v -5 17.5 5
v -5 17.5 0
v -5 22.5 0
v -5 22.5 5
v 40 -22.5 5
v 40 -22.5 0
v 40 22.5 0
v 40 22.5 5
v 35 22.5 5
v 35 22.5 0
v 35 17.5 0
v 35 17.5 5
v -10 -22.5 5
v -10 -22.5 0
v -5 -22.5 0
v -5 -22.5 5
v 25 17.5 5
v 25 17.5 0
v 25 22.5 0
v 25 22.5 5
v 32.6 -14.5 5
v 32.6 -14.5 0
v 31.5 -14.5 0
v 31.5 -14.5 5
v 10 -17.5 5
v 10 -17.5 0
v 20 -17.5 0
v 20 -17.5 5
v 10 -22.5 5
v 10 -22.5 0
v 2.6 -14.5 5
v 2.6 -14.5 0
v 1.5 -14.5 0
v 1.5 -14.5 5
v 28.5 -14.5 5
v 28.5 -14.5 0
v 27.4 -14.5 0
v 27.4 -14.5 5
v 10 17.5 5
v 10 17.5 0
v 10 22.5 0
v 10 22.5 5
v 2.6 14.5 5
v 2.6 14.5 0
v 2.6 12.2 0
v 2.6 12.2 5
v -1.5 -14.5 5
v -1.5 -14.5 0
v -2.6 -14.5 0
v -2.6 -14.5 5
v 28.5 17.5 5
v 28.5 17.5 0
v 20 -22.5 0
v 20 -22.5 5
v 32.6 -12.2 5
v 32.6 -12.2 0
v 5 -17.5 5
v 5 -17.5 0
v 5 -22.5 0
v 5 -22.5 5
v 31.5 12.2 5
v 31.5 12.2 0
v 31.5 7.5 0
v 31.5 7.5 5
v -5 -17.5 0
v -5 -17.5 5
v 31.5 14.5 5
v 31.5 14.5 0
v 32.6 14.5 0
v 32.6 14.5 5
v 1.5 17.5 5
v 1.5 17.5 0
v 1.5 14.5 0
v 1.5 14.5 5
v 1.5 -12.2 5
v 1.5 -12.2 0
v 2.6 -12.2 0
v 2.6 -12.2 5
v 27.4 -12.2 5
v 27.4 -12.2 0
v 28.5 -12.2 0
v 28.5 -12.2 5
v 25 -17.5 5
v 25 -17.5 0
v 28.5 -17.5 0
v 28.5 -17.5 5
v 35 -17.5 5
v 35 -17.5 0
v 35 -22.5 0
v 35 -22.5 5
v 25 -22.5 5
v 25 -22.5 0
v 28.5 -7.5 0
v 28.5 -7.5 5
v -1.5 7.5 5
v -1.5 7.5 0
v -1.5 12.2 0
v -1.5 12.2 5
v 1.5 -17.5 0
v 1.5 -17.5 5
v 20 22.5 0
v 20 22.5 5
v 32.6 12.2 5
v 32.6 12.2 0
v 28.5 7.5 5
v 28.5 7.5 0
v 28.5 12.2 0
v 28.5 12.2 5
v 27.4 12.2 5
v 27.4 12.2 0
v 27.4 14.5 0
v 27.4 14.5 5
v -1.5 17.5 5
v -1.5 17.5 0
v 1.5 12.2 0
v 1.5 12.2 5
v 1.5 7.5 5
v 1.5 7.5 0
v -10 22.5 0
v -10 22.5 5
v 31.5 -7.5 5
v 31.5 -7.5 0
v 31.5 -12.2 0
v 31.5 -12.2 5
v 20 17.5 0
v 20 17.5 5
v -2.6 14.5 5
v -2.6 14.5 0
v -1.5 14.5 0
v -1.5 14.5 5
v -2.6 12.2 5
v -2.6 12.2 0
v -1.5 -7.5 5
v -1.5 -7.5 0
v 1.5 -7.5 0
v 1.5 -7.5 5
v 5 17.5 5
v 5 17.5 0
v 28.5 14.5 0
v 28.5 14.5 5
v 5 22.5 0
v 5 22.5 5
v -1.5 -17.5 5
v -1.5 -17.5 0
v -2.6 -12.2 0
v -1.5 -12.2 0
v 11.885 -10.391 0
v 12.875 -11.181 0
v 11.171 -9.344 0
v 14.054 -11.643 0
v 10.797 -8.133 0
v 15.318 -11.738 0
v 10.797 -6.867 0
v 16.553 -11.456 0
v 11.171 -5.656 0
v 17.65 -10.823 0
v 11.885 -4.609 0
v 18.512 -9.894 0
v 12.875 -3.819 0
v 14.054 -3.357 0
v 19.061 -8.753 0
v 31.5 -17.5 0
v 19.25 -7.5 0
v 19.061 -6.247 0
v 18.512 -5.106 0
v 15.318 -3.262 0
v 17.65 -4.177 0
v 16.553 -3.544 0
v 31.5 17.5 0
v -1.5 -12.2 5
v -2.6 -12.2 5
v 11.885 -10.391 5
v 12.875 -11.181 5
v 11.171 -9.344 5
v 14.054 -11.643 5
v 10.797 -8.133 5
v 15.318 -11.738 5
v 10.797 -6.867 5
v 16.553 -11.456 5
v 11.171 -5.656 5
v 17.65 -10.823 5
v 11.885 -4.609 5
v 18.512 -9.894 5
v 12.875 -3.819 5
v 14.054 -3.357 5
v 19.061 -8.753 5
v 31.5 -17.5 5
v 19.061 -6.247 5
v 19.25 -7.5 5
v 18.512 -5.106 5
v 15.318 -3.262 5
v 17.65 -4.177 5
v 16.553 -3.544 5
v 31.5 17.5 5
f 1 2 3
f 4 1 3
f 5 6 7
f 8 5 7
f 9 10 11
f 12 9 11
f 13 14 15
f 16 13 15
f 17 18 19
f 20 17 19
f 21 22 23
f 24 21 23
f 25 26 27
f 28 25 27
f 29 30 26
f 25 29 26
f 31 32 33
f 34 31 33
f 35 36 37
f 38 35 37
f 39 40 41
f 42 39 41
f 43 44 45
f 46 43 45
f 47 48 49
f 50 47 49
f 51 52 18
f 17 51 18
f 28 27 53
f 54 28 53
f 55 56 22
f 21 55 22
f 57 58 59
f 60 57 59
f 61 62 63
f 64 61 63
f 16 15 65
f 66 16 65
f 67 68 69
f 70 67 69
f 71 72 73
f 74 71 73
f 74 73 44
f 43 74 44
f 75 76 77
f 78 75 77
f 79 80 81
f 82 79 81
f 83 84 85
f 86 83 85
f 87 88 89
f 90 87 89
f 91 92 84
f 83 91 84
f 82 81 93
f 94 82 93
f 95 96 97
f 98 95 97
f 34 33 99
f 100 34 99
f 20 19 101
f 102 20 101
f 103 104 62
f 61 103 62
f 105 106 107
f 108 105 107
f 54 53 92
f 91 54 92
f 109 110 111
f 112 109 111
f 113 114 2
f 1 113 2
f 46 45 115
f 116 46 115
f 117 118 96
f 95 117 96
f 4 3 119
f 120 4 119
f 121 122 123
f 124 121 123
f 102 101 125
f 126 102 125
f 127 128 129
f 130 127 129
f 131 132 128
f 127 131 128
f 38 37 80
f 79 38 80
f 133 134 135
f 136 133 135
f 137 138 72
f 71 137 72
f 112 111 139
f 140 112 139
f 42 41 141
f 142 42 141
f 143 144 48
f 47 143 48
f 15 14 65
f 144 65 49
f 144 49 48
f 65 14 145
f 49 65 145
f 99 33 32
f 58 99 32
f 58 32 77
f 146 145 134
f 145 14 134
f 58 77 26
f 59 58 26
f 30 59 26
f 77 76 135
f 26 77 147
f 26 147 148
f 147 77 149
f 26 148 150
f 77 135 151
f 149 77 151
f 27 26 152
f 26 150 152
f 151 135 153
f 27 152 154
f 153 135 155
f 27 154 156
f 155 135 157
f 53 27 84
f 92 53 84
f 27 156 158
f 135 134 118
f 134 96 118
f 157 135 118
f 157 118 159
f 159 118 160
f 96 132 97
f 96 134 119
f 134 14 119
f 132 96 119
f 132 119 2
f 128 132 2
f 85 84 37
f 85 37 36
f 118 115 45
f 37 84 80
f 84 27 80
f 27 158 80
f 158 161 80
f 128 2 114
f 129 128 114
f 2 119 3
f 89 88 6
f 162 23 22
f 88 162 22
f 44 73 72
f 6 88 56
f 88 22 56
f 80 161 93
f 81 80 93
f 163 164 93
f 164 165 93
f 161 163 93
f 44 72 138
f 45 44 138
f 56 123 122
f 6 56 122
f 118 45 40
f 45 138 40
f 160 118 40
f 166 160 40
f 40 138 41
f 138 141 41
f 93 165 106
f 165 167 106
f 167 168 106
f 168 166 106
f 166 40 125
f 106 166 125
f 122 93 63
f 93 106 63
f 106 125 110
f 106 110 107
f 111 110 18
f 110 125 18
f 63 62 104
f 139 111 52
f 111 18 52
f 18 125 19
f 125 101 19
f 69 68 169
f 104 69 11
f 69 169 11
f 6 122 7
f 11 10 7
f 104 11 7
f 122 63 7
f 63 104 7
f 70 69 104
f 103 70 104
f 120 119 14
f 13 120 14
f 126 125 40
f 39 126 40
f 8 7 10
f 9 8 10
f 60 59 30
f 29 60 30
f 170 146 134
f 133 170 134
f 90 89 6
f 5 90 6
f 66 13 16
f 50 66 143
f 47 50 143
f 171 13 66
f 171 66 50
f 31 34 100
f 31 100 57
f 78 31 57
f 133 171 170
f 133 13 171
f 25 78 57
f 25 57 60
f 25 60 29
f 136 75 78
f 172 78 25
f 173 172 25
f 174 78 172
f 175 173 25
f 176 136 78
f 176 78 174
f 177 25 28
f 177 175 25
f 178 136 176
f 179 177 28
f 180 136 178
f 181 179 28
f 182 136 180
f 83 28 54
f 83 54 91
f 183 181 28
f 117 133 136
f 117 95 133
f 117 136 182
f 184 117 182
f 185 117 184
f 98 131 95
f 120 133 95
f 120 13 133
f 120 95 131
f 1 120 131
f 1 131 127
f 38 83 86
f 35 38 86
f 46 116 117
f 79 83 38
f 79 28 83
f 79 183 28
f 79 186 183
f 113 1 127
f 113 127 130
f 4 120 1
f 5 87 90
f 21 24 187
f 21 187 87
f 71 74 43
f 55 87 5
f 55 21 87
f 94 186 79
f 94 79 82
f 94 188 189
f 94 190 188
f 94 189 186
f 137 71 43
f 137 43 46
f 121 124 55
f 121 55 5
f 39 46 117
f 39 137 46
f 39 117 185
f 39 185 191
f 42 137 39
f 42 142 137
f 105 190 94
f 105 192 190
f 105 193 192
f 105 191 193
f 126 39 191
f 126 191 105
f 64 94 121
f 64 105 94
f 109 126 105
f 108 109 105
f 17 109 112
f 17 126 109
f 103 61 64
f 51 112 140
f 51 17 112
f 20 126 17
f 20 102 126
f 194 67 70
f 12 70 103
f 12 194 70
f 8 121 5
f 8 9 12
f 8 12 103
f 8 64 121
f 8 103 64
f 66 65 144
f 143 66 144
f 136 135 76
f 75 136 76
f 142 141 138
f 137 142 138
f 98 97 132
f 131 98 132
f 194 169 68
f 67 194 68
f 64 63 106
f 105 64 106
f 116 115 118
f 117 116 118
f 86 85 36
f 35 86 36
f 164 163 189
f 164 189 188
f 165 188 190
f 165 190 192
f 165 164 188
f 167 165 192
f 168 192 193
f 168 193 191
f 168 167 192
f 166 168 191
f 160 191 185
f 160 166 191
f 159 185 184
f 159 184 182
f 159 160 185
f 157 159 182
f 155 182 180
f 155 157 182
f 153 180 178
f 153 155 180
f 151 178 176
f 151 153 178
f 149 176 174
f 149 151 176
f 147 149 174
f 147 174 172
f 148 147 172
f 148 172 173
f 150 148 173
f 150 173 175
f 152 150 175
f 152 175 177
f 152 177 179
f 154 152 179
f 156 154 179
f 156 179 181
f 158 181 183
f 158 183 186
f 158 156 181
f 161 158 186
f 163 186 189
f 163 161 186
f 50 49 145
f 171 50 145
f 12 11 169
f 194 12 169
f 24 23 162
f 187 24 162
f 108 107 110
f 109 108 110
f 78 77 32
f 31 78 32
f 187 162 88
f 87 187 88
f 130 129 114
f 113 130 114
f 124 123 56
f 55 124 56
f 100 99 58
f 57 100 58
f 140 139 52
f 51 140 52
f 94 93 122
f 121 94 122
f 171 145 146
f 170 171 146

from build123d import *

# Parameters (mm, degrees)
ESQUISSE1_R        = 4.25
BOSS_EXTRU_1_DEPTH = 5


with BuildPart() as part:
    # Esquisse1 → Boss.-Extru.1 (new body)
    # profile 1 of 2: a face of its own
    with BuildSketch(Plane.XY):
        Polygon((-10, 22.5), (-10, 17.5), (-10, -17.5), (-10, -22.5), (-5, -22.5), (-5, -17.5), (-1.5, -17.5), (-1.5, -14.5), (-2.6, -14.5), (-2.6, -12.2), (-1.5, -12.2), (-1.5, -7.5), (1.5, -7.5), (1.5, -12.2), (2.6, -12.2), (2.6, -14.5), (1.5, -14.5), (1.5, -17.5), (5, -17.5), (5, -22.5), (10, -22.5), (10, -17.5), (10, 17.5), (10, 22.5), (5, 22.5), (5, 17.5), (1.5, 17.5), (1.5, 14.5), (2.6, 14.5), (2.6, 12.2), (1.5, 12.2), (1.5, 7.5), (-1.5, 7.5), (-1.5, 12.2), (-2.6, 12.2), (-2.6, 14.5), (-1.5, 14.5), (-1.5, 17.5), (-5, 17.5), (-5, 22.5), align=None)
    # profile 2 of 2: a face of its own
    with BuildSketch(Plane.XY):
        Polygon((20, 17.5), (10, 17.5), (10, -17.5), (20, -17.5), (20, -22.5), (25, -22.5), (25, -17.5), (28.5, -17.5), (28.5, -14.5), (27.4, -14.5), (27.4, -12.2), (28.5, -12.2), (28.5, -7.5), (31.5, -7.5), (31.5, -12.2), (32.6, -12.2), (32.6, -14.5), (31.5, -14.5), (31.5, -17.5), (35, -17.5), (35, -22.5), (40, -22.5), (40, -17.5), (40, 17.5), (40, 22.5), (35, 22.5), (35, 17.5), (31.5, 17.5), (31.5, 14.5), (32.6, 14.5), (32.6, 12.2), (31.5, 12.2), (31.5, 7.5), (28.5, 7.5), (28.5, 12.2), (27.4, 12.2), (27.4, 14.5), (28.5, 14.5), (28.5, 17.5), (25, 17.5), (25, 22.5), (20, 22.5), align=None)
        with Locations((15, -7.5)):
            Circle(ESQUISSE1_R, mode=Mode.SUBTRACT)
    extrude(amount=BOSS_EXTRU_1_DEPTH)


solid = part.part
